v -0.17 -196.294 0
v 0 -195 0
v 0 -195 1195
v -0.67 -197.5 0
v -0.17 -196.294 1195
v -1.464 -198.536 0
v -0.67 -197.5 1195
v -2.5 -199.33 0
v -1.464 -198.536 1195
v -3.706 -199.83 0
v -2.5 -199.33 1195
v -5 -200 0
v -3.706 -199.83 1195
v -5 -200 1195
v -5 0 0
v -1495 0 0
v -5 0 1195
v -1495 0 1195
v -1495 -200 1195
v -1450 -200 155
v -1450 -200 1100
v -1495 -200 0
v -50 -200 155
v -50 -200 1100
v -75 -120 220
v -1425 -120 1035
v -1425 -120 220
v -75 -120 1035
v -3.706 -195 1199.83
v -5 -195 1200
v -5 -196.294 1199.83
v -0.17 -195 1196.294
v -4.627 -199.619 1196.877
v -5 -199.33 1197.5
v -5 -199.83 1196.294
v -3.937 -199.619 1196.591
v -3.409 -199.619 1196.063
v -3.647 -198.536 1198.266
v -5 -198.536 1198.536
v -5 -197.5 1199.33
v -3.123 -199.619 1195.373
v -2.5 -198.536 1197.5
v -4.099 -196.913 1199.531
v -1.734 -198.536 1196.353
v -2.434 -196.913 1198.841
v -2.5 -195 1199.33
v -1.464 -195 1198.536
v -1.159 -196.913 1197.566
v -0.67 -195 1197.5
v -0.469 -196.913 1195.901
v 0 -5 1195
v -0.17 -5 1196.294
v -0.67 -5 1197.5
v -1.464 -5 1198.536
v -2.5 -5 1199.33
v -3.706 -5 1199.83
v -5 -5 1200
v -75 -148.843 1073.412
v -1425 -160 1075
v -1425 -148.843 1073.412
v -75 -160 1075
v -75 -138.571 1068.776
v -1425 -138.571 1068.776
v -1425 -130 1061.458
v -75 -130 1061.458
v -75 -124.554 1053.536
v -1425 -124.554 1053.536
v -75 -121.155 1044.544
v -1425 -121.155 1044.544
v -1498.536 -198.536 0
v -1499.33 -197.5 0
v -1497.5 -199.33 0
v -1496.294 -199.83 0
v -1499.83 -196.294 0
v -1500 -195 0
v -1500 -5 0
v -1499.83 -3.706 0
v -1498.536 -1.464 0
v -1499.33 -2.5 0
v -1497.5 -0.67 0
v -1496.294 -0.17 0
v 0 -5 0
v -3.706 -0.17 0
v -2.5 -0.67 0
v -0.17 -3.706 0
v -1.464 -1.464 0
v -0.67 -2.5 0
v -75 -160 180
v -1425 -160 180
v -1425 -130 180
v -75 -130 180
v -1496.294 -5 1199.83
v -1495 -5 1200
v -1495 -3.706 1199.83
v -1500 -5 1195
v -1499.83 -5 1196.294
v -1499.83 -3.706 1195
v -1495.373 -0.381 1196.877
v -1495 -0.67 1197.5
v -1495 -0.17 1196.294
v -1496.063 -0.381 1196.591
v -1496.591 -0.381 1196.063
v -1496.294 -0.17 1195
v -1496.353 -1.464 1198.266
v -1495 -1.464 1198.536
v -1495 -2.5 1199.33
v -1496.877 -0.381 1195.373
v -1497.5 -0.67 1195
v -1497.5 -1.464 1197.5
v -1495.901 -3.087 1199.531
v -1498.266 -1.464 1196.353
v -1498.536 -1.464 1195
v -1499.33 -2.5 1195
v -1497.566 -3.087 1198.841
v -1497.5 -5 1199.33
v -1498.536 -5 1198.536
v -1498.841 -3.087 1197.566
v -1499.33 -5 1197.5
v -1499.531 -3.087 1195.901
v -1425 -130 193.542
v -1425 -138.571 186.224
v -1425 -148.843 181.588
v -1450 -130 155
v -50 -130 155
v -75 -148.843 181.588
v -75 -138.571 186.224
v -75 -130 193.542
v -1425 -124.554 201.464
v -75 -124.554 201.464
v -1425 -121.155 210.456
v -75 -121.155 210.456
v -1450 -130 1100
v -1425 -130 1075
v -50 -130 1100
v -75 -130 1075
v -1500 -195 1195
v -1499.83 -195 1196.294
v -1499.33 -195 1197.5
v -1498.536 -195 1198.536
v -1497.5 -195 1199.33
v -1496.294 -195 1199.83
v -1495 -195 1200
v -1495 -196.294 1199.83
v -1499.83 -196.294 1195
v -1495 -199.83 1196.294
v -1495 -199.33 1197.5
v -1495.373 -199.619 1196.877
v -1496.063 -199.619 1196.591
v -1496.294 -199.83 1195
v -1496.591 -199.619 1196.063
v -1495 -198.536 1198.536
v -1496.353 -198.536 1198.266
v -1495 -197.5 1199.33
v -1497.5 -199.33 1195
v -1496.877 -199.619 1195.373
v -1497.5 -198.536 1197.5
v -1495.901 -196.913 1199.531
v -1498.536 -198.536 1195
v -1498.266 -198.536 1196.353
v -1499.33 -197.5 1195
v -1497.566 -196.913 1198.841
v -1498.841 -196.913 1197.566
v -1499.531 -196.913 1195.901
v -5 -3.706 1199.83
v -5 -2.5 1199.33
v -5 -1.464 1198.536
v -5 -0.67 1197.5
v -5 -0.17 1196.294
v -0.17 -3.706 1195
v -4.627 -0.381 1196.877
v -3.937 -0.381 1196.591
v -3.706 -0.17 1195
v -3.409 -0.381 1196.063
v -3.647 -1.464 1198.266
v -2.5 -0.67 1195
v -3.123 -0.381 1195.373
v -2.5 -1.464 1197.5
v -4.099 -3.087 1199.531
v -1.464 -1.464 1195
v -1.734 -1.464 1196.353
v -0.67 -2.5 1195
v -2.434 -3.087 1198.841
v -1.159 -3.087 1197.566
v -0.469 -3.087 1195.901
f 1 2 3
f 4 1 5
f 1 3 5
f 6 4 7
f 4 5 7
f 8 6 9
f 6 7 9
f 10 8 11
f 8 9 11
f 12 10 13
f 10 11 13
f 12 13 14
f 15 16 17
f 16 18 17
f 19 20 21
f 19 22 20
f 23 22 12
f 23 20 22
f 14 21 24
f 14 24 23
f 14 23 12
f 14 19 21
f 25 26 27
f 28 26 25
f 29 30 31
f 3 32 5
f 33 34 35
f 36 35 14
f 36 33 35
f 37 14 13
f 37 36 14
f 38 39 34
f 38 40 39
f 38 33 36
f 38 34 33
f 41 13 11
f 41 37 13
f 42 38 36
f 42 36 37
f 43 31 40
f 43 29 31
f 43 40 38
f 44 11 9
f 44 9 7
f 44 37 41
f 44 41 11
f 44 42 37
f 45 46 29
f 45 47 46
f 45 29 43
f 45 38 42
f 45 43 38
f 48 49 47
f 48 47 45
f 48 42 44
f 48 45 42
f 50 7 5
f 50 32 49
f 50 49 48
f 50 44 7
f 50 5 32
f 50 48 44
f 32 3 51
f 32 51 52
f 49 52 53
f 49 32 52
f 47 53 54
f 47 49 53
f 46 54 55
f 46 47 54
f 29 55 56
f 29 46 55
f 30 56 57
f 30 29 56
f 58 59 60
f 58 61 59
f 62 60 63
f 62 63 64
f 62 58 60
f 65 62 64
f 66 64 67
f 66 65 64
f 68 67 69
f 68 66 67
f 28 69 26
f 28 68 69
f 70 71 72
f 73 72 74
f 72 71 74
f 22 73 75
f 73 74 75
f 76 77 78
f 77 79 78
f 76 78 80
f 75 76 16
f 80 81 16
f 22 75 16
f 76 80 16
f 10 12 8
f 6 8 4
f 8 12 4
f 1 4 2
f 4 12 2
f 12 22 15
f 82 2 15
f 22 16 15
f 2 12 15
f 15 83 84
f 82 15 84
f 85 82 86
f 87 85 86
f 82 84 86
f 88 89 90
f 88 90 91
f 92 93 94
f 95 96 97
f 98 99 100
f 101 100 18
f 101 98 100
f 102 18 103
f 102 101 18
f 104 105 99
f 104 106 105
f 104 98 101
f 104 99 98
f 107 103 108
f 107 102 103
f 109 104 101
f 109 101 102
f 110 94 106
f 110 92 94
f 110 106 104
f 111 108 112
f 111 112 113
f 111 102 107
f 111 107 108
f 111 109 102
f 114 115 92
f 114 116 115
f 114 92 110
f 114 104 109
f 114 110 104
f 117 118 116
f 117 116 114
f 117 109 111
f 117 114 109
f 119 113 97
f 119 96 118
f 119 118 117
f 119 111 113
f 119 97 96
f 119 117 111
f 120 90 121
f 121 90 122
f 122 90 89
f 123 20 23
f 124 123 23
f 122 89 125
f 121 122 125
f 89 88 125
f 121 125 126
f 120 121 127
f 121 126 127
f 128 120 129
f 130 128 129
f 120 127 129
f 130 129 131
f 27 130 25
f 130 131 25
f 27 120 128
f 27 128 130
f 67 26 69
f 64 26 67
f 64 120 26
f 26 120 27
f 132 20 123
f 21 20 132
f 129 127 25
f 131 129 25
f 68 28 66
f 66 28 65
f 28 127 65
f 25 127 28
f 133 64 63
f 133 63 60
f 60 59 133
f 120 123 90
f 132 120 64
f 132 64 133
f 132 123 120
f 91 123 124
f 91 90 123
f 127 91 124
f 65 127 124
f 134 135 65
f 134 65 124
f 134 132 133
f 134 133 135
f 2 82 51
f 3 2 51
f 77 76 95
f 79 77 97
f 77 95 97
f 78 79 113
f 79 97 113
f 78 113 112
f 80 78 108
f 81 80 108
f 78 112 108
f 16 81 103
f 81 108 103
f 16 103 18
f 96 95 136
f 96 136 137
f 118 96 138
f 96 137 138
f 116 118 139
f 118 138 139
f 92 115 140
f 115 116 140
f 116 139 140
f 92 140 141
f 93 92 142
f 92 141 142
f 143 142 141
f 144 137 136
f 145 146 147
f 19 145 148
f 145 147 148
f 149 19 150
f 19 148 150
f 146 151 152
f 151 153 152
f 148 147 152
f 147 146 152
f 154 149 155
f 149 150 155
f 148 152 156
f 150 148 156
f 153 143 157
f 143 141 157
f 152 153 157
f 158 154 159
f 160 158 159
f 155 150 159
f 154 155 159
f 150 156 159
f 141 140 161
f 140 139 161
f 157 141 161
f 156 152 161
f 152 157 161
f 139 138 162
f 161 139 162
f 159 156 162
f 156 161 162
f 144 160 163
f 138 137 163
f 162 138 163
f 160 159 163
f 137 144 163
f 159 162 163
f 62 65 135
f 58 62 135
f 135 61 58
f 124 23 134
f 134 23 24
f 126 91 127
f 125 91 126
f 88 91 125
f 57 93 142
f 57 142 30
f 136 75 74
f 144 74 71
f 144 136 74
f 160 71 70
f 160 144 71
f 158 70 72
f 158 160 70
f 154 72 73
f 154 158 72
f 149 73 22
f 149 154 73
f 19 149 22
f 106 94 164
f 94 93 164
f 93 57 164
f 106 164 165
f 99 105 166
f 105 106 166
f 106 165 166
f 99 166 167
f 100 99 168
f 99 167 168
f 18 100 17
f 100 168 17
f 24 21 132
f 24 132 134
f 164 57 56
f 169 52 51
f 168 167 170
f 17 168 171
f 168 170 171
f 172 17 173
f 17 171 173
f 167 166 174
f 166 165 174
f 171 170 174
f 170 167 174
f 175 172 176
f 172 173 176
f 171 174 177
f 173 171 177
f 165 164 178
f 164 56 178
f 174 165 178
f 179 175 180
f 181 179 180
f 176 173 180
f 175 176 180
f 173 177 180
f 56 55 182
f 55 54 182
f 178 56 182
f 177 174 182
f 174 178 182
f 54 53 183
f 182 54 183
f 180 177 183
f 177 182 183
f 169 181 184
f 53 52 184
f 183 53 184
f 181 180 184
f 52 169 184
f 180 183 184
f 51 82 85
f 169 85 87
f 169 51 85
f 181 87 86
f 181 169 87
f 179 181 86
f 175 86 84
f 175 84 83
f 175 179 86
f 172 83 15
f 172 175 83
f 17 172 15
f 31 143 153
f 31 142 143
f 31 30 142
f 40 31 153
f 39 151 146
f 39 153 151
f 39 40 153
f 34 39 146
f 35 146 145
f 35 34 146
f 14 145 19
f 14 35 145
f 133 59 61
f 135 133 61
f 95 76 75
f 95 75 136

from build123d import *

# Parameters (mm, degrees)
F0_W     = 1500
F0_H     = 1200
F1_DEPTH = 200
F2_R     = 5
F3_W     = 1350
F3_H     = 895
F4_DEPTH = 80
F5_R     = 40
F6_W     = 1400
F6_H     = 945
F6_W_2   = 1350
F6_H_2   = 895
F7_DEPTH = 70


with BuildPart() as f1:
    # F0 (on Front) → F1 (new body)
    with BuildSketch(Plane.XZ):
        with Locations((-750, 600)):
            Rectangle(F0_W, F0_H)
    extrude(amount=F1_DEPTH)

    # F2
    f2_edges = [f1.edges().sort_by_distance(p)[0] for p in [
        (-1500, -100, 1200),
        (0, -100, 1200),
        (-750, 0, 1200),
        (-750, -200, 1200),
        (-1500, -200, 600),
        (-1500, 0, 600),
        (0, -200, 600),
        (0, 0, 600),
    ]]
    fillet(f2_edges, radius=F2_R)

    # F3 (on face) → F4 (cut)
    with BuildSketch(Plane.XZ.offset(200)):
        with Locations((-750, 627.5)):
            Rectangle(F3_W, F3_H)
    extrude(amount=-F4_DEPTH, mode=Mode.SUBTRACT)

    # F5
    f5_edges = [f1.edges().sort_by_distance(p)[0] for p in [
        (-750, -120, 180),
        (-750, -120, 1075),
    ]]
    fillet(f5_edges, radius=F5_R)

    # F6 (on face) → F7 (cut)
    with BuildSketch(Plane.XZ.offset(200)):
        with Locations((-750, 627.5)):
            Rectangle(F6_W, F6_H)
        with Locations((-750, 627.5)):
            Rectangle(F6_W_2, F6_H_2, mode=Mode.SUBTRACT)
    extrude(amount=-F7_DEPTH, mode=Mode.SUBTRACT)


solid = f1.part
